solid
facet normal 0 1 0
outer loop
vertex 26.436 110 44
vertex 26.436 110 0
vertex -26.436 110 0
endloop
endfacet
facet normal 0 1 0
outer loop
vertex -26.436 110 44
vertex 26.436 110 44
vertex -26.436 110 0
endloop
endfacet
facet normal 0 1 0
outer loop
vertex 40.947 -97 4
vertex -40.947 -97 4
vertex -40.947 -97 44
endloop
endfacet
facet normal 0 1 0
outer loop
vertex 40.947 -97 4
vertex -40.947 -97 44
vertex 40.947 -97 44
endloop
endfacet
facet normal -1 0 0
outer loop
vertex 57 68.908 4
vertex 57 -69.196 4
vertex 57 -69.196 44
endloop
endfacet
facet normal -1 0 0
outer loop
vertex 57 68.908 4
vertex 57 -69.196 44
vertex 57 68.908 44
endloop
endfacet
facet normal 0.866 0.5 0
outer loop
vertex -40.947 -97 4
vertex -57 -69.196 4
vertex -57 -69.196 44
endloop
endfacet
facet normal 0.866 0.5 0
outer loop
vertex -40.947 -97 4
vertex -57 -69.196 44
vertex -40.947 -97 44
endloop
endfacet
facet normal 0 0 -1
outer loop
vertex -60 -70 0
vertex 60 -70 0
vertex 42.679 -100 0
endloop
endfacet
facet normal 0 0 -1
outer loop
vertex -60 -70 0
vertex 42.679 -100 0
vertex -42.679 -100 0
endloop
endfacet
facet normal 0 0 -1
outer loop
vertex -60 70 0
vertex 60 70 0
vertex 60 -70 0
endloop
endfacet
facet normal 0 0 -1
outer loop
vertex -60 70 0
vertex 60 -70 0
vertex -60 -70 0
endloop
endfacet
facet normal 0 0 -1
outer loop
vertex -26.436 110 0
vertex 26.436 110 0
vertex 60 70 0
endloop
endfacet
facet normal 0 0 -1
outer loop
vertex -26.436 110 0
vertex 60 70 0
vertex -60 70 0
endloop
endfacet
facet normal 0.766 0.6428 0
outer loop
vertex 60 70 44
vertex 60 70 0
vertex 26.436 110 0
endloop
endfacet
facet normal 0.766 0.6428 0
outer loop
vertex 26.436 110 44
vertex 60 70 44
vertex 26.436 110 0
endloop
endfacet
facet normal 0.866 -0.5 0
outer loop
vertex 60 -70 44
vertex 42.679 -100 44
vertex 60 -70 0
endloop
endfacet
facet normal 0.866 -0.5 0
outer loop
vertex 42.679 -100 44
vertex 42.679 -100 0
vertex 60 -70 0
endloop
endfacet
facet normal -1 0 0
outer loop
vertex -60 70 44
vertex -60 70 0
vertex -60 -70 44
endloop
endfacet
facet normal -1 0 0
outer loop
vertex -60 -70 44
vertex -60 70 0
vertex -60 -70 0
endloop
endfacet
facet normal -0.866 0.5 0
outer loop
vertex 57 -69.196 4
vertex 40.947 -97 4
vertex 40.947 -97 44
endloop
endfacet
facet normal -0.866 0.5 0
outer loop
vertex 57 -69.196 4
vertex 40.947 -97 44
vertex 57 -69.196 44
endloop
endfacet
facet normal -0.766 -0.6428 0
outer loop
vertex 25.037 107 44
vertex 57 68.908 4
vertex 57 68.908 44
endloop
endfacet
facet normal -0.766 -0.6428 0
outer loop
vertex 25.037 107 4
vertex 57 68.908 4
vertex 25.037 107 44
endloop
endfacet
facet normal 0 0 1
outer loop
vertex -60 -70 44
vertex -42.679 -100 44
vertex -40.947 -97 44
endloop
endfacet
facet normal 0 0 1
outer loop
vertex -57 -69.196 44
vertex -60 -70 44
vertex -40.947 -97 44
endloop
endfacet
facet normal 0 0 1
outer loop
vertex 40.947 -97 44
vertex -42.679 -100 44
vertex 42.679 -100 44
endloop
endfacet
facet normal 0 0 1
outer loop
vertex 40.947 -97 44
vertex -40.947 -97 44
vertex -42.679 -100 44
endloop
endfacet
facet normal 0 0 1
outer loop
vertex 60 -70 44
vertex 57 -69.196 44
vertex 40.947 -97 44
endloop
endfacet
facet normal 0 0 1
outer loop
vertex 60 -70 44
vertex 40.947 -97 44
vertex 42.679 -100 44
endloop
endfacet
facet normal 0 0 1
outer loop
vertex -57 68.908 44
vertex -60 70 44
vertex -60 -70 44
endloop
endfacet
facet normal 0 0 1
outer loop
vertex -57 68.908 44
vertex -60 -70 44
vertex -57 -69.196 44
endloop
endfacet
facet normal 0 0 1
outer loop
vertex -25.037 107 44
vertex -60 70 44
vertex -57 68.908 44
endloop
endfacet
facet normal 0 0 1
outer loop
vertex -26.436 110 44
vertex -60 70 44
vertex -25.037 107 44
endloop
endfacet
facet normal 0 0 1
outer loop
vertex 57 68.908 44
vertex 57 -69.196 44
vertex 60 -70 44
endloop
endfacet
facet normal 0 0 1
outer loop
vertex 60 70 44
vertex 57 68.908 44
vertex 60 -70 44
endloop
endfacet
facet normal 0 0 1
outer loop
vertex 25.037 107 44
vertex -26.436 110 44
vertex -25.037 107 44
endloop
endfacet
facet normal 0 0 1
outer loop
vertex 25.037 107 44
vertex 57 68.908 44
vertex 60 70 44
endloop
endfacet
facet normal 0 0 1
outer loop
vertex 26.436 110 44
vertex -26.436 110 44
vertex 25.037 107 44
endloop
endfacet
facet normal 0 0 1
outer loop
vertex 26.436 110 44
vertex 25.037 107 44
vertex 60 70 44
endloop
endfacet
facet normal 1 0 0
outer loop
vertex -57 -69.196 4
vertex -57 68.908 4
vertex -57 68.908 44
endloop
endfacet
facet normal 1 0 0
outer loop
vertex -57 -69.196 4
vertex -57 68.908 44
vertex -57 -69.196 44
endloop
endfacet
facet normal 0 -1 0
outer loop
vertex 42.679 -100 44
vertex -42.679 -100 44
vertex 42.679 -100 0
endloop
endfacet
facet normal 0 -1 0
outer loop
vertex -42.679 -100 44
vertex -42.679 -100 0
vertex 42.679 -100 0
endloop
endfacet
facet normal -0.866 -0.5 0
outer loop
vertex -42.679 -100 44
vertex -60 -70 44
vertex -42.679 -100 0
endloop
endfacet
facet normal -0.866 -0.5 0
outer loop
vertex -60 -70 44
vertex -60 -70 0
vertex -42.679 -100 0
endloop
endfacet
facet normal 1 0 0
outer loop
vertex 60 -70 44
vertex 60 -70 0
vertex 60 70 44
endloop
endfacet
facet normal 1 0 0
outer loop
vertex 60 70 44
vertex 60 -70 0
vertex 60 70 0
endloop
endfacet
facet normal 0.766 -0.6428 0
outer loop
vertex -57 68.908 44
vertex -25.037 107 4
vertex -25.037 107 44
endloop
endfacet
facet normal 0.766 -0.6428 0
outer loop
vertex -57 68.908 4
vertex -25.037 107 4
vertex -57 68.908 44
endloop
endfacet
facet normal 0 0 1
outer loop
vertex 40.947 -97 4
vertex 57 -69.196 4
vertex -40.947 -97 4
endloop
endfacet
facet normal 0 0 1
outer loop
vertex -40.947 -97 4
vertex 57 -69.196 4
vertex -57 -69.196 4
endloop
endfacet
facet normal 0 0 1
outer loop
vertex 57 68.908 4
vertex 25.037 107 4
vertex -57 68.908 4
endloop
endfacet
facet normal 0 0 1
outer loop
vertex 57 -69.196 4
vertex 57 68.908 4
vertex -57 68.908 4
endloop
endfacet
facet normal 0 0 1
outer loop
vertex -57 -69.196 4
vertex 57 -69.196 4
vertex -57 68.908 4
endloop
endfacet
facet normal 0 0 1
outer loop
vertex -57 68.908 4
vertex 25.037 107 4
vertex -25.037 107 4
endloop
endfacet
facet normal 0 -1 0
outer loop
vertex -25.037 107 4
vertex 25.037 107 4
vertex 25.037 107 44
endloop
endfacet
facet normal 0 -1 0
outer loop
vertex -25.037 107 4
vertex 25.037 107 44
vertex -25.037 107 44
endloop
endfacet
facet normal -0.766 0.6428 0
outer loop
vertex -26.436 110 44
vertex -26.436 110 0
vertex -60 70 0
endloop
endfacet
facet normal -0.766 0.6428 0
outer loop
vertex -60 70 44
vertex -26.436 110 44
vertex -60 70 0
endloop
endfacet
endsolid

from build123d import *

# Parameters (mm, degrees)
BOSS_EXTRUDE1_DEPTH = 4
BOSS_EXTRUDE2_DEPTH = 40


with BuildPart() as part:
    # Sketch1 → Boss-Extrude1 (new body)
    with BuildSketch(Plane.XY):
        Polygon((-60, 70), (-26.436014753, 110), (26.436014753, 110), (60, 70), (60, -70), (42.679491924, -100), (-42.679491924, -100), (-60, -70), align=None)
    extrude(amount=BOSS_EXTRUDE1_DEPTH)

    # Sketch2 → Boss-Extrude2 (add)
    with BuildSketch(Plane.XY.offset(4)):
        Polygon((-26.436014753, 110), (-60, 70), (-60, -70), (-42.679491924, -100), (42.679491924, -100), (60, -70), (60, 70), (26.436014753, 110), align=None)
        Polygon((-25.037091778, 107), (-57, 68.908089297), (-57, -69.196152423), (-40.947441117, -97), (40.947441117, -97), (57, -69.196152423), (57, 68.908089297), (25.037091778, 107), align=None, mode=Mode.SUBTRACT)
    extrude(amount=BOSS_EXTRUDE2_DEPTH)


solid = part.part
